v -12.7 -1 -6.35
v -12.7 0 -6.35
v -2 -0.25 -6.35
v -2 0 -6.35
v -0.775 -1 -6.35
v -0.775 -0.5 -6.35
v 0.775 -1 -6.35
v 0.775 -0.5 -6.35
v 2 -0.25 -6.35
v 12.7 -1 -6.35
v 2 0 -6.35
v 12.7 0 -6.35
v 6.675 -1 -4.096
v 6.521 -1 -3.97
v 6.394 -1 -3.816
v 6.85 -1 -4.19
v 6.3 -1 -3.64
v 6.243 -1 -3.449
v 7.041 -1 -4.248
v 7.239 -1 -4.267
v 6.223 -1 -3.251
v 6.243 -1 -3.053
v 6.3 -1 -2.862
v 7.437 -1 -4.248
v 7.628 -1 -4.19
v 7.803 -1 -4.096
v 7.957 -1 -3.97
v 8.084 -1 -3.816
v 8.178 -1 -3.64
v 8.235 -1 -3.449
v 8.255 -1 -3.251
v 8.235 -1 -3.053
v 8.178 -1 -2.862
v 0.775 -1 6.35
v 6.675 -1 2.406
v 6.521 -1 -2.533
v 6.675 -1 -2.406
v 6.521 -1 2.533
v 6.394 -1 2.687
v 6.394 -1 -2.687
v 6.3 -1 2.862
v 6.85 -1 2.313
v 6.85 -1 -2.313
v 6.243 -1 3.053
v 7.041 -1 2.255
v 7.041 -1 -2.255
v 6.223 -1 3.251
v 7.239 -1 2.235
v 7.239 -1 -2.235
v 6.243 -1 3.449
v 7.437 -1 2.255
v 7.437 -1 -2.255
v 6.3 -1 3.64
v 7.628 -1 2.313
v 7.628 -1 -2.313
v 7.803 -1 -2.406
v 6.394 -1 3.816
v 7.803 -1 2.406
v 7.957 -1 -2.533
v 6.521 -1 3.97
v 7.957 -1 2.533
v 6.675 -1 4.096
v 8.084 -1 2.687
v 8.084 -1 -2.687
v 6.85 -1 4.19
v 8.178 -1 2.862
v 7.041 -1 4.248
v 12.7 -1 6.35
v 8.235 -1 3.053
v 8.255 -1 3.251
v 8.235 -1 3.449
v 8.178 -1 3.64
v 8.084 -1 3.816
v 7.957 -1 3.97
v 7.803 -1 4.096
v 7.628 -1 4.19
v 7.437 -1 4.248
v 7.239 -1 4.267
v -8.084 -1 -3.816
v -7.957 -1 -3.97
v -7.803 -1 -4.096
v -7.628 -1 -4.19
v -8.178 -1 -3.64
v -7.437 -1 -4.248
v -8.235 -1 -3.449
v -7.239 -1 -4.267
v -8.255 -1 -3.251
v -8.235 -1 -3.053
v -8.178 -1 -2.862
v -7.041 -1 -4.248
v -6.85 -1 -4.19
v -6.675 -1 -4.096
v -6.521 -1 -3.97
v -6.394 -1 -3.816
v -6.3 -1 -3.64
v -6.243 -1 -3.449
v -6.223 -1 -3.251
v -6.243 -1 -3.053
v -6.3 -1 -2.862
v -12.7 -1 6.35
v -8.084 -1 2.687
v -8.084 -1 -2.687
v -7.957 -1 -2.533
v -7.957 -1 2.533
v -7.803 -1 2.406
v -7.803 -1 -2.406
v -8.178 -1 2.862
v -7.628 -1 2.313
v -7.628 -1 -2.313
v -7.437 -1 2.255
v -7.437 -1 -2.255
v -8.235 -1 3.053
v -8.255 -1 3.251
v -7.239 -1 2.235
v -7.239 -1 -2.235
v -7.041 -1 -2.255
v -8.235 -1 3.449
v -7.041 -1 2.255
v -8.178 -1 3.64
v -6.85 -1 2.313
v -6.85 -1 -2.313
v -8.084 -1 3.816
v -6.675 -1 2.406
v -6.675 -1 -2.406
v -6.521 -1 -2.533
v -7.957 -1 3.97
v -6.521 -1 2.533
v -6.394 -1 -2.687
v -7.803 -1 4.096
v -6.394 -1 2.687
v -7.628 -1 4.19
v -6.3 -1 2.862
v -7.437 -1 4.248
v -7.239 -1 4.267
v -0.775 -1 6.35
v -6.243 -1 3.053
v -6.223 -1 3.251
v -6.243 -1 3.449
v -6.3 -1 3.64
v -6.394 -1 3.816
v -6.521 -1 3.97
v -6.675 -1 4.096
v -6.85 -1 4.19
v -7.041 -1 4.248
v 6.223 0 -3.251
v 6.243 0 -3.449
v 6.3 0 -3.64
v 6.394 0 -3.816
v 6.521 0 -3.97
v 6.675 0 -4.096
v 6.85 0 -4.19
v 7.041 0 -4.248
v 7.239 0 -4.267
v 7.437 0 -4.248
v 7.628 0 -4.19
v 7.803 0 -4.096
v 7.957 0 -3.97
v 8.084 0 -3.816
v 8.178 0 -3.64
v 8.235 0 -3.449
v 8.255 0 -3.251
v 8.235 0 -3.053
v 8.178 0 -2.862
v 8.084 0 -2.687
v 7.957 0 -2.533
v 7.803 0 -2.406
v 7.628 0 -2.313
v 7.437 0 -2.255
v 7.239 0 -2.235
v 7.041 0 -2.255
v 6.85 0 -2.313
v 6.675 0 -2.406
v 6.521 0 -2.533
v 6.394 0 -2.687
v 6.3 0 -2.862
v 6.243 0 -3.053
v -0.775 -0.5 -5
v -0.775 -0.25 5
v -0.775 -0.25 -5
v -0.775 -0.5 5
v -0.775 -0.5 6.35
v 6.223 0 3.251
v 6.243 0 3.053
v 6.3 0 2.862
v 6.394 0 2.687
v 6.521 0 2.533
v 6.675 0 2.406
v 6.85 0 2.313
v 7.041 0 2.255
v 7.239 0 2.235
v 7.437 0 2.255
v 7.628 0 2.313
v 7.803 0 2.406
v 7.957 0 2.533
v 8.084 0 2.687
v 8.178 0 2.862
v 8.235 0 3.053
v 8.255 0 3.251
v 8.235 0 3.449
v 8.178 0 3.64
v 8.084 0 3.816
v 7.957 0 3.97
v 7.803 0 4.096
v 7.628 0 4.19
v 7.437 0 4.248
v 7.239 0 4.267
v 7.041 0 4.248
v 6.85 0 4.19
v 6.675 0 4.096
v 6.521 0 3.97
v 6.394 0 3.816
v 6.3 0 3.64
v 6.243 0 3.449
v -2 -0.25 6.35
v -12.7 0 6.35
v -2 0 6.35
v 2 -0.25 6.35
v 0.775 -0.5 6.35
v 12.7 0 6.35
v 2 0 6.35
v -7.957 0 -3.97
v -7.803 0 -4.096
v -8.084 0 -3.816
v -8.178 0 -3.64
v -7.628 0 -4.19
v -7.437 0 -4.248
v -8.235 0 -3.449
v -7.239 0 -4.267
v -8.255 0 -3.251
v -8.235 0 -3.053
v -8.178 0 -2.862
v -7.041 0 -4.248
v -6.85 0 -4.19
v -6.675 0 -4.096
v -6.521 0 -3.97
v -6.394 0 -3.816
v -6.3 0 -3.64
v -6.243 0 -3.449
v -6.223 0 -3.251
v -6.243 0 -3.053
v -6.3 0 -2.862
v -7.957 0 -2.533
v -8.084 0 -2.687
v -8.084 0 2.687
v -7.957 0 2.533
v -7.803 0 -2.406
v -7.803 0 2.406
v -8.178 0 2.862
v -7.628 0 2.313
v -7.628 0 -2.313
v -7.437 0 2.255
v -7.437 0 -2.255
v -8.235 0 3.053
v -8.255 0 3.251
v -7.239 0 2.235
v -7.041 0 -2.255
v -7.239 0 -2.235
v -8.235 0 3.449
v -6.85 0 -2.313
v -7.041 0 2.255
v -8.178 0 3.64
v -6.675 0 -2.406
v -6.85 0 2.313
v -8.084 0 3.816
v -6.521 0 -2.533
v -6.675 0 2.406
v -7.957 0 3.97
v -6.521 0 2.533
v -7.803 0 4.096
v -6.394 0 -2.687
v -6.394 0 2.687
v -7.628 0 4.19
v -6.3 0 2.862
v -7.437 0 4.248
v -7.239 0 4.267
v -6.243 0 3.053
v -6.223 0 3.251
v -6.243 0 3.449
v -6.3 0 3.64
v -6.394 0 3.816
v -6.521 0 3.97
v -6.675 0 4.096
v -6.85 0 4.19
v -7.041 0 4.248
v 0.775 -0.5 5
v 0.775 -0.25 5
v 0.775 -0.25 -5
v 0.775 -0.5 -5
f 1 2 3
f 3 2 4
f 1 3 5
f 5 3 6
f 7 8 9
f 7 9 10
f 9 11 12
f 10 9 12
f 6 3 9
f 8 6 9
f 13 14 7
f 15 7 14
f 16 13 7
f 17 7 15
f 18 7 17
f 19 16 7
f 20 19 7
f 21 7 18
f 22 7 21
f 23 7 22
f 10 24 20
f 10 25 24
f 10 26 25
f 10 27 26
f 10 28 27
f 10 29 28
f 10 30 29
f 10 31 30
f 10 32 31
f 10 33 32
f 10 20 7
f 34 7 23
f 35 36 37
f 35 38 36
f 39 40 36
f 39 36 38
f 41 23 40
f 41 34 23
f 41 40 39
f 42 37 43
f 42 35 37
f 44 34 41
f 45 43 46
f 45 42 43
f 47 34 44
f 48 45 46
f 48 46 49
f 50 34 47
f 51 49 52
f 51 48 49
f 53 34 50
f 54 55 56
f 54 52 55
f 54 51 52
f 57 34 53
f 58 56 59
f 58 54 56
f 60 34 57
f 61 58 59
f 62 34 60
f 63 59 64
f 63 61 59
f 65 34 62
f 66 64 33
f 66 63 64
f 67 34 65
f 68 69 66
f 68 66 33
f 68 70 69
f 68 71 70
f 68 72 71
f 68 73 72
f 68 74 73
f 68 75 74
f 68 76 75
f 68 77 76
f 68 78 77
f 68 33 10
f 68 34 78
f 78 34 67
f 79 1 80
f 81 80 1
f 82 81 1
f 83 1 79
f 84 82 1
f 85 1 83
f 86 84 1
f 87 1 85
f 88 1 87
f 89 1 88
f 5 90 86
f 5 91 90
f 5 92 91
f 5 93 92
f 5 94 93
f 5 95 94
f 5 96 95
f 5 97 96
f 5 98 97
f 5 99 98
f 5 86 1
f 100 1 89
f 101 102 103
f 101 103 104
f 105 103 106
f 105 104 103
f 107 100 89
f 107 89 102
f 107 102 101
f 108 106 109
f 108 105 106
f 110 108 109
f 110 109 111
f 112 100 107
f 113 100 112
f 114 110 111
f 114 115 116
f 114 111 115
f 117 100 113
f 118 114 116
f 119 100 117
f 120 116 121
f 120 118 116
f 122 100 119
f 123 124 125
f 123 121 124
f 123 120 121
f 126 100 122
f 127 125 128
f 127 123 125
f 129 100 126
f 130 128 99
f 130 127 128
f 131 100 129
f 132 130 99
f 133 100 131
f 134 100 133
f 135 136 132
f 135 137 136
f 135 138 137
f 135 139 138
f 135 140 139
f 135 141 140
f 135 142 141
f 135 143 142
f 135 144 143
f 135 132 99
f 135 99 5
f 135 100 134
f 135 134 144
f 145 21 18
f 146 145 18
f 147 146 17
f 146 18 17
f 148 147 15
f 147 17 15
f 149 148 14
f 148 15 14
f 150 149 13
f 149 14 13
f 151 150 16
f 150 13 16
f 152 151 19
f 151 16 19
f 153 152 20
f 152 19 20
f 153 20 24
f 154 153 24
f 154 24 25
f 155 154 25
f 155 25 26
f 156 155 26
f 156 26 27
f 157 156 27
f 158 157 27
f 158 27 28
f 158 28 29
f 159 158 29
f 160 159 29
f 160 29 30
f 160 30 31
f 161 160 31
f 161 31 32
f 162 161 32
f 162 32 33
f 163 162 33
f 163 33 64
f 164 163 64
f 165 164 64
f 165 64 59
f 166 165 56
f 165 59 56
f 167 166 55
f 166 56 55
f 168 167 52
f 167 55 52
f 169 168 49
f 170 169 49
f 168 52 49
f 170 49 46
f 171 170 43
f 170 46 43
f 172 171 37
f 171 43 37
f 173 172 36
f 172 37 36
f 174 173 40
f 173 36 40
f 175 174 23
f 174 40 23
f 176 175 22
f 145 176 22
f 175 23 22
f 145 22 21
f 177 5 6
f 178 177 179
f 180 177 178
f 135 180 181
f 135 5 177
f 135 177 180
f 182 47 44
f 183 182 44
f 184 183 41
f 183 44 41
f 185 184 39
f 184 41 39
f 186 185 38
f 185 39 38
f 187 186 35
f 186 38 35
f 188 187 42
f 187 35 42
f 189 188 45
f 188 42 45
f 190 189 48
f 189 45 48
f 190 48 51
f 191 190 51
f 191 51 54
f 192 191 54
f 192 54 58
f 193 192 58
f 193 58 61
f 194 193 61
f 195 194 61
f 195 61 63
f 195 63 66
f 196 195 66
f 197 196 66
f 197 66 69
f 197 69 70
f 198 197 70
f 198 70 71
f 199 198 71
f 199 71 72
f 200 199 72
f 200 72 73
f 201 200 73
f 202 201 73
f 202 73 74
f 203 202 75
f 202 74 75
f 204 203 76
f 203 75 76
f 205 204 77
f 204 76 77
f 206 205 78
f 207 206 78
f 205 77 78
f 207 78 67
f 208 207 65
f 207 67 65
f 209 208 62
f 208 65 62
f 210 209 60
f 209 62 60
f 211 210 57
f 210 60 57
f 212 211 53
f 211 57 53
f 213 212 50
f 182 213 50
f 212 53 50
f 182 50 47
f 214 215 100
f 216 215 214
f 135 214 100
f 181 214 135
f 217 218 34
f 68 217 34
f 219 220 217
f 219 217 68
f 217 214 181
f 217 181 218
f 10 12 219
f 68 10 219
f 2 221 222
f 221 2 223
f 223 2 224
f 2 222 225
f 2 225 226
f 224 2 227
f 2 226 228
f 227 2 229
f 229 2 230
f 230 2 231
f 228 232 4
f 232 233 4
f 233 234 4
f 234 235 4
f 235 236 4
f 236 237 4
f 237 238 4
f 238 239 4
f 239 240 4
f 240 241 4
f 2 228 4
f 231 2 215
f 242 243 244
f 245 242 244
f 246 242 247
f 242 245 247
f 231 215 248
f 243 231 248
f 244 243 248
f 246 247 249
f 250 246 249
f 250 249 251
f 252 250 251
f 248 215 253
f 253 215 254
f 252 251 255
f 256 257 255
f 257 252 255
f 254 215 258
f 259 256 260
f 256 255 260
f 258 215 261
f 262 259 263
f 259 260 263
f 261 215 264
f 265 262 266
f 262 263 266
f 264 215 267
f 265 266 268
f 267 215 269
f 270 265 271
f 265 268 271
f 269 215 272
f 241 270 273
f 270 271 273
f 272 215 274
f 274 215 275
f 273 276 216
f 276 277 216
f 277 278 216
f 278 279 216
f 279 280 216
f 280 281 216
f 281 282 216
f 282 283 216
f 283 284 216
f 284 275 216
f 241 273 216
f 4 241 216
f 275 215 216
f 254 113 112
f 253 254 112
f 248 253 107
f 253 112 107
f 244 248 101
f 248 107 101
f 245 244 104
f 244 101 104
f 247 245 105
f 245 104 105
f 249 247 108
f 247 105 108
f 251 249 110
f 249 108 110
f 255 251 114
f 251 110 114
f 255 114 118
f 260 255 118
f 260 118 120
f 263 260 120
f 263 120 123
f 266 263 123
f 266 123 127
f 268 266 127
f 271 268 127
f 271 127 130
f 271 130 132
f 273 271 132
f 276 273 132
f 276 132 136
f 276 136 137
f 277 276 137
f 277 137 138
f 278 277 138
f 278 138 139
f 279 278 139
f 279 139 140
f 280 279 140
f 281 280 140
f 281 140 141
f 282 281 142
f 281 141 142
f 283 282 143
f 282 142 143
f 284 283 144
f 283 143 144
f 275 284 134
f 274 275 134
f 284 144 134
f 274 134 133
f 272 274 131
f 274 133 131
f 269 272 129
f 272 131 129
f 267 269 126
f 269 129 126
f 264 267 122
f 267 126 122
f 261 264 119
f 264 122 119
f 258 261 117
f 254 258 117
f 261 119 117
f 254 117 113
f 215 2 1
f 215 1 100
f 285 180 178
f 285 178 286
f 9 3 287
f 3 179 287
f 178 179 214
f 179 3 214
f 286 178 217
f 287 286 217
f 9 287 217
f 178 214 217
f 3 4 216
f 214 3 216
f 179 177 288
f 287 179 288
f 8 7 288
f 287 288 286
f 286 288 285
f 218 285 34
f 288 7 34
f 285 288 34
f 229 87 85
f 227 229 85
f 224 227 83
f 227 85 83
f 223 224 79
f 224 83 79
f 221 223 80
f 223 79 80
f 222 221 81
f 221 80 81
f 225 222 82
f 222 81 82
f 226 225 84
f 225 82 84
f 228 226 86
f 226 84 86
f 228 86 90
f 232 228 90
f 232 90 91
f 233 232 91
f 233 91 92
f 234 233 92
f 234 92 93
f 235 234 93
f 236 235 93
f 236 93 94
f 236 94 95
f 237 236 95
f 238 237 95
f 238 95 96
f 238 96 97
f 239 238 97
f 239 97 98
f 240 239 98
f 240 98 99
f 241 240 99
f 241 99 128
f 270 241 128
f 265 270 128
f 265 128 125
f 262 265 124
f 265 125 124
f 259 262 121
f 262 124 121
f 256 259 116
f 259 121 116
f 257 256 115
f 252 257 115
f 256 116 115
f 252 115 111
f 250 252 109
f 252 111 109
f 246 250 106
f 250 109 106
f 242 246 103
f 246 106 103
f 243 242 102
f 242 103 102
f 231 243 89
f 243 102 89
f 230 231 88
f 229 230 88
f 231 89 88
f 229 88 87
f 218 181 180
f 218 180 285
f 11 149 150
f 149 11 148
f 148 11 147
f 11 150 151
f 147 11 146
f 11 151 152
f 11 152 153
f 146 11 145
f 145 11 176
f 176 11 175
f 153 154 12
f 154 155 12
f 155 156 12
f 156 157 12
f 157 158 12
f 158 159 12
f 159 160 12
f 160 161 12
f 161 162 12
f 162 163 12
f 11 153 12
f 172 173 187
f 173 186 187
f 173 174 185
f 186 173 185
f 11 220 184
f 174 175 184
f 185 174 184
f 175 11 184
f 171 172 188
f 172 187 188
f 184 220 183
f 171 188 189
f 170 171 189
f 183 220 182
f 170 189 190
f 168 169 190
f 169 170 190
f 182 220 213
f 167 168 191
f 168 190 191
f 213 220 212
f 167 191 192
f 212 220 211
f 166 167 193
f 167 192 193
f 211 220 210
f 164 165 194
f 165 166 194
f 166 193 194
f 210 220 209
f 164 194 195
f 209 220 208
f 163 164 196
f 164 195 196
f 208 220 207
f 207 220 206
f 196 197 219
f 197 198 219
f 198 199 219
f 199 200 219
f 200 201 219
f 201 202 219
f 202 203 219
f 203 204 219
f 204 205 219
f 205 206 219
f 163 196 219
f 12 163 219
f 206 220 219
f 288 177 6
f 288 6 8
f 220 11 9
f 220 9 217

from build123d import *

# Parameters (mm, degrees)
F0_W     = 25.4
F0_H     = 12.7
F1_DEPTH = 1
F3_D     = 2.032
F4_W     = 4
F4_H     = 12.7
F5_DEPTH = 0.25
F6_W     = 1.55
F6_H     = 12.7
F7_DEPTH = 0.5
F8_W     = 1.55
F8_H     = 10
F9_DEPTH = 0.25


with BuildPart() as f1:
    # F0 (on Front) → F1 (new body)
    with BuildSketch(Plane.XZ):
        Rectangle(F0_W, F0_H)
    extrude(amount=F1_DEPTH)

    # F3 (through all)
    with Locations(Plane(origin=(0, 0, 0), x_dir=(1, 0, 0), z_dir=(0, 1, 0))):
        with Locations((-7.239, 3.2512), (7.239, 3.2512), (7.239, -3.2512), (-7.239, -3.2512)):
            Hole(F3_D / 2)

    # F4 (on Front) → F5 (cut)
    with BuildSketch(Plane.XZ):
        Rectangle(F4_W, F4_H)
    extrude(amount=F5_DEPTH, mode=Mode.SUBTRACT)

    # F6 (on face) → F7 (cut)
    with BuildSketch(Plane.XZ.offset(1)):
        Rectangle(F6_W, F6_H)
    extrude(amount=-F7_DEPTH, mode=Mode.SUBTRACT)

    # F8 (on face) → F9 (cut)
    with BuildSketch(Plane.XZ.offset(0.5)):
        Rectangle(F8_W, F8_H)
    extrude(amount=-F9_DEPTH, mode=Mode.SUBTRACT)


solid = f1.part
